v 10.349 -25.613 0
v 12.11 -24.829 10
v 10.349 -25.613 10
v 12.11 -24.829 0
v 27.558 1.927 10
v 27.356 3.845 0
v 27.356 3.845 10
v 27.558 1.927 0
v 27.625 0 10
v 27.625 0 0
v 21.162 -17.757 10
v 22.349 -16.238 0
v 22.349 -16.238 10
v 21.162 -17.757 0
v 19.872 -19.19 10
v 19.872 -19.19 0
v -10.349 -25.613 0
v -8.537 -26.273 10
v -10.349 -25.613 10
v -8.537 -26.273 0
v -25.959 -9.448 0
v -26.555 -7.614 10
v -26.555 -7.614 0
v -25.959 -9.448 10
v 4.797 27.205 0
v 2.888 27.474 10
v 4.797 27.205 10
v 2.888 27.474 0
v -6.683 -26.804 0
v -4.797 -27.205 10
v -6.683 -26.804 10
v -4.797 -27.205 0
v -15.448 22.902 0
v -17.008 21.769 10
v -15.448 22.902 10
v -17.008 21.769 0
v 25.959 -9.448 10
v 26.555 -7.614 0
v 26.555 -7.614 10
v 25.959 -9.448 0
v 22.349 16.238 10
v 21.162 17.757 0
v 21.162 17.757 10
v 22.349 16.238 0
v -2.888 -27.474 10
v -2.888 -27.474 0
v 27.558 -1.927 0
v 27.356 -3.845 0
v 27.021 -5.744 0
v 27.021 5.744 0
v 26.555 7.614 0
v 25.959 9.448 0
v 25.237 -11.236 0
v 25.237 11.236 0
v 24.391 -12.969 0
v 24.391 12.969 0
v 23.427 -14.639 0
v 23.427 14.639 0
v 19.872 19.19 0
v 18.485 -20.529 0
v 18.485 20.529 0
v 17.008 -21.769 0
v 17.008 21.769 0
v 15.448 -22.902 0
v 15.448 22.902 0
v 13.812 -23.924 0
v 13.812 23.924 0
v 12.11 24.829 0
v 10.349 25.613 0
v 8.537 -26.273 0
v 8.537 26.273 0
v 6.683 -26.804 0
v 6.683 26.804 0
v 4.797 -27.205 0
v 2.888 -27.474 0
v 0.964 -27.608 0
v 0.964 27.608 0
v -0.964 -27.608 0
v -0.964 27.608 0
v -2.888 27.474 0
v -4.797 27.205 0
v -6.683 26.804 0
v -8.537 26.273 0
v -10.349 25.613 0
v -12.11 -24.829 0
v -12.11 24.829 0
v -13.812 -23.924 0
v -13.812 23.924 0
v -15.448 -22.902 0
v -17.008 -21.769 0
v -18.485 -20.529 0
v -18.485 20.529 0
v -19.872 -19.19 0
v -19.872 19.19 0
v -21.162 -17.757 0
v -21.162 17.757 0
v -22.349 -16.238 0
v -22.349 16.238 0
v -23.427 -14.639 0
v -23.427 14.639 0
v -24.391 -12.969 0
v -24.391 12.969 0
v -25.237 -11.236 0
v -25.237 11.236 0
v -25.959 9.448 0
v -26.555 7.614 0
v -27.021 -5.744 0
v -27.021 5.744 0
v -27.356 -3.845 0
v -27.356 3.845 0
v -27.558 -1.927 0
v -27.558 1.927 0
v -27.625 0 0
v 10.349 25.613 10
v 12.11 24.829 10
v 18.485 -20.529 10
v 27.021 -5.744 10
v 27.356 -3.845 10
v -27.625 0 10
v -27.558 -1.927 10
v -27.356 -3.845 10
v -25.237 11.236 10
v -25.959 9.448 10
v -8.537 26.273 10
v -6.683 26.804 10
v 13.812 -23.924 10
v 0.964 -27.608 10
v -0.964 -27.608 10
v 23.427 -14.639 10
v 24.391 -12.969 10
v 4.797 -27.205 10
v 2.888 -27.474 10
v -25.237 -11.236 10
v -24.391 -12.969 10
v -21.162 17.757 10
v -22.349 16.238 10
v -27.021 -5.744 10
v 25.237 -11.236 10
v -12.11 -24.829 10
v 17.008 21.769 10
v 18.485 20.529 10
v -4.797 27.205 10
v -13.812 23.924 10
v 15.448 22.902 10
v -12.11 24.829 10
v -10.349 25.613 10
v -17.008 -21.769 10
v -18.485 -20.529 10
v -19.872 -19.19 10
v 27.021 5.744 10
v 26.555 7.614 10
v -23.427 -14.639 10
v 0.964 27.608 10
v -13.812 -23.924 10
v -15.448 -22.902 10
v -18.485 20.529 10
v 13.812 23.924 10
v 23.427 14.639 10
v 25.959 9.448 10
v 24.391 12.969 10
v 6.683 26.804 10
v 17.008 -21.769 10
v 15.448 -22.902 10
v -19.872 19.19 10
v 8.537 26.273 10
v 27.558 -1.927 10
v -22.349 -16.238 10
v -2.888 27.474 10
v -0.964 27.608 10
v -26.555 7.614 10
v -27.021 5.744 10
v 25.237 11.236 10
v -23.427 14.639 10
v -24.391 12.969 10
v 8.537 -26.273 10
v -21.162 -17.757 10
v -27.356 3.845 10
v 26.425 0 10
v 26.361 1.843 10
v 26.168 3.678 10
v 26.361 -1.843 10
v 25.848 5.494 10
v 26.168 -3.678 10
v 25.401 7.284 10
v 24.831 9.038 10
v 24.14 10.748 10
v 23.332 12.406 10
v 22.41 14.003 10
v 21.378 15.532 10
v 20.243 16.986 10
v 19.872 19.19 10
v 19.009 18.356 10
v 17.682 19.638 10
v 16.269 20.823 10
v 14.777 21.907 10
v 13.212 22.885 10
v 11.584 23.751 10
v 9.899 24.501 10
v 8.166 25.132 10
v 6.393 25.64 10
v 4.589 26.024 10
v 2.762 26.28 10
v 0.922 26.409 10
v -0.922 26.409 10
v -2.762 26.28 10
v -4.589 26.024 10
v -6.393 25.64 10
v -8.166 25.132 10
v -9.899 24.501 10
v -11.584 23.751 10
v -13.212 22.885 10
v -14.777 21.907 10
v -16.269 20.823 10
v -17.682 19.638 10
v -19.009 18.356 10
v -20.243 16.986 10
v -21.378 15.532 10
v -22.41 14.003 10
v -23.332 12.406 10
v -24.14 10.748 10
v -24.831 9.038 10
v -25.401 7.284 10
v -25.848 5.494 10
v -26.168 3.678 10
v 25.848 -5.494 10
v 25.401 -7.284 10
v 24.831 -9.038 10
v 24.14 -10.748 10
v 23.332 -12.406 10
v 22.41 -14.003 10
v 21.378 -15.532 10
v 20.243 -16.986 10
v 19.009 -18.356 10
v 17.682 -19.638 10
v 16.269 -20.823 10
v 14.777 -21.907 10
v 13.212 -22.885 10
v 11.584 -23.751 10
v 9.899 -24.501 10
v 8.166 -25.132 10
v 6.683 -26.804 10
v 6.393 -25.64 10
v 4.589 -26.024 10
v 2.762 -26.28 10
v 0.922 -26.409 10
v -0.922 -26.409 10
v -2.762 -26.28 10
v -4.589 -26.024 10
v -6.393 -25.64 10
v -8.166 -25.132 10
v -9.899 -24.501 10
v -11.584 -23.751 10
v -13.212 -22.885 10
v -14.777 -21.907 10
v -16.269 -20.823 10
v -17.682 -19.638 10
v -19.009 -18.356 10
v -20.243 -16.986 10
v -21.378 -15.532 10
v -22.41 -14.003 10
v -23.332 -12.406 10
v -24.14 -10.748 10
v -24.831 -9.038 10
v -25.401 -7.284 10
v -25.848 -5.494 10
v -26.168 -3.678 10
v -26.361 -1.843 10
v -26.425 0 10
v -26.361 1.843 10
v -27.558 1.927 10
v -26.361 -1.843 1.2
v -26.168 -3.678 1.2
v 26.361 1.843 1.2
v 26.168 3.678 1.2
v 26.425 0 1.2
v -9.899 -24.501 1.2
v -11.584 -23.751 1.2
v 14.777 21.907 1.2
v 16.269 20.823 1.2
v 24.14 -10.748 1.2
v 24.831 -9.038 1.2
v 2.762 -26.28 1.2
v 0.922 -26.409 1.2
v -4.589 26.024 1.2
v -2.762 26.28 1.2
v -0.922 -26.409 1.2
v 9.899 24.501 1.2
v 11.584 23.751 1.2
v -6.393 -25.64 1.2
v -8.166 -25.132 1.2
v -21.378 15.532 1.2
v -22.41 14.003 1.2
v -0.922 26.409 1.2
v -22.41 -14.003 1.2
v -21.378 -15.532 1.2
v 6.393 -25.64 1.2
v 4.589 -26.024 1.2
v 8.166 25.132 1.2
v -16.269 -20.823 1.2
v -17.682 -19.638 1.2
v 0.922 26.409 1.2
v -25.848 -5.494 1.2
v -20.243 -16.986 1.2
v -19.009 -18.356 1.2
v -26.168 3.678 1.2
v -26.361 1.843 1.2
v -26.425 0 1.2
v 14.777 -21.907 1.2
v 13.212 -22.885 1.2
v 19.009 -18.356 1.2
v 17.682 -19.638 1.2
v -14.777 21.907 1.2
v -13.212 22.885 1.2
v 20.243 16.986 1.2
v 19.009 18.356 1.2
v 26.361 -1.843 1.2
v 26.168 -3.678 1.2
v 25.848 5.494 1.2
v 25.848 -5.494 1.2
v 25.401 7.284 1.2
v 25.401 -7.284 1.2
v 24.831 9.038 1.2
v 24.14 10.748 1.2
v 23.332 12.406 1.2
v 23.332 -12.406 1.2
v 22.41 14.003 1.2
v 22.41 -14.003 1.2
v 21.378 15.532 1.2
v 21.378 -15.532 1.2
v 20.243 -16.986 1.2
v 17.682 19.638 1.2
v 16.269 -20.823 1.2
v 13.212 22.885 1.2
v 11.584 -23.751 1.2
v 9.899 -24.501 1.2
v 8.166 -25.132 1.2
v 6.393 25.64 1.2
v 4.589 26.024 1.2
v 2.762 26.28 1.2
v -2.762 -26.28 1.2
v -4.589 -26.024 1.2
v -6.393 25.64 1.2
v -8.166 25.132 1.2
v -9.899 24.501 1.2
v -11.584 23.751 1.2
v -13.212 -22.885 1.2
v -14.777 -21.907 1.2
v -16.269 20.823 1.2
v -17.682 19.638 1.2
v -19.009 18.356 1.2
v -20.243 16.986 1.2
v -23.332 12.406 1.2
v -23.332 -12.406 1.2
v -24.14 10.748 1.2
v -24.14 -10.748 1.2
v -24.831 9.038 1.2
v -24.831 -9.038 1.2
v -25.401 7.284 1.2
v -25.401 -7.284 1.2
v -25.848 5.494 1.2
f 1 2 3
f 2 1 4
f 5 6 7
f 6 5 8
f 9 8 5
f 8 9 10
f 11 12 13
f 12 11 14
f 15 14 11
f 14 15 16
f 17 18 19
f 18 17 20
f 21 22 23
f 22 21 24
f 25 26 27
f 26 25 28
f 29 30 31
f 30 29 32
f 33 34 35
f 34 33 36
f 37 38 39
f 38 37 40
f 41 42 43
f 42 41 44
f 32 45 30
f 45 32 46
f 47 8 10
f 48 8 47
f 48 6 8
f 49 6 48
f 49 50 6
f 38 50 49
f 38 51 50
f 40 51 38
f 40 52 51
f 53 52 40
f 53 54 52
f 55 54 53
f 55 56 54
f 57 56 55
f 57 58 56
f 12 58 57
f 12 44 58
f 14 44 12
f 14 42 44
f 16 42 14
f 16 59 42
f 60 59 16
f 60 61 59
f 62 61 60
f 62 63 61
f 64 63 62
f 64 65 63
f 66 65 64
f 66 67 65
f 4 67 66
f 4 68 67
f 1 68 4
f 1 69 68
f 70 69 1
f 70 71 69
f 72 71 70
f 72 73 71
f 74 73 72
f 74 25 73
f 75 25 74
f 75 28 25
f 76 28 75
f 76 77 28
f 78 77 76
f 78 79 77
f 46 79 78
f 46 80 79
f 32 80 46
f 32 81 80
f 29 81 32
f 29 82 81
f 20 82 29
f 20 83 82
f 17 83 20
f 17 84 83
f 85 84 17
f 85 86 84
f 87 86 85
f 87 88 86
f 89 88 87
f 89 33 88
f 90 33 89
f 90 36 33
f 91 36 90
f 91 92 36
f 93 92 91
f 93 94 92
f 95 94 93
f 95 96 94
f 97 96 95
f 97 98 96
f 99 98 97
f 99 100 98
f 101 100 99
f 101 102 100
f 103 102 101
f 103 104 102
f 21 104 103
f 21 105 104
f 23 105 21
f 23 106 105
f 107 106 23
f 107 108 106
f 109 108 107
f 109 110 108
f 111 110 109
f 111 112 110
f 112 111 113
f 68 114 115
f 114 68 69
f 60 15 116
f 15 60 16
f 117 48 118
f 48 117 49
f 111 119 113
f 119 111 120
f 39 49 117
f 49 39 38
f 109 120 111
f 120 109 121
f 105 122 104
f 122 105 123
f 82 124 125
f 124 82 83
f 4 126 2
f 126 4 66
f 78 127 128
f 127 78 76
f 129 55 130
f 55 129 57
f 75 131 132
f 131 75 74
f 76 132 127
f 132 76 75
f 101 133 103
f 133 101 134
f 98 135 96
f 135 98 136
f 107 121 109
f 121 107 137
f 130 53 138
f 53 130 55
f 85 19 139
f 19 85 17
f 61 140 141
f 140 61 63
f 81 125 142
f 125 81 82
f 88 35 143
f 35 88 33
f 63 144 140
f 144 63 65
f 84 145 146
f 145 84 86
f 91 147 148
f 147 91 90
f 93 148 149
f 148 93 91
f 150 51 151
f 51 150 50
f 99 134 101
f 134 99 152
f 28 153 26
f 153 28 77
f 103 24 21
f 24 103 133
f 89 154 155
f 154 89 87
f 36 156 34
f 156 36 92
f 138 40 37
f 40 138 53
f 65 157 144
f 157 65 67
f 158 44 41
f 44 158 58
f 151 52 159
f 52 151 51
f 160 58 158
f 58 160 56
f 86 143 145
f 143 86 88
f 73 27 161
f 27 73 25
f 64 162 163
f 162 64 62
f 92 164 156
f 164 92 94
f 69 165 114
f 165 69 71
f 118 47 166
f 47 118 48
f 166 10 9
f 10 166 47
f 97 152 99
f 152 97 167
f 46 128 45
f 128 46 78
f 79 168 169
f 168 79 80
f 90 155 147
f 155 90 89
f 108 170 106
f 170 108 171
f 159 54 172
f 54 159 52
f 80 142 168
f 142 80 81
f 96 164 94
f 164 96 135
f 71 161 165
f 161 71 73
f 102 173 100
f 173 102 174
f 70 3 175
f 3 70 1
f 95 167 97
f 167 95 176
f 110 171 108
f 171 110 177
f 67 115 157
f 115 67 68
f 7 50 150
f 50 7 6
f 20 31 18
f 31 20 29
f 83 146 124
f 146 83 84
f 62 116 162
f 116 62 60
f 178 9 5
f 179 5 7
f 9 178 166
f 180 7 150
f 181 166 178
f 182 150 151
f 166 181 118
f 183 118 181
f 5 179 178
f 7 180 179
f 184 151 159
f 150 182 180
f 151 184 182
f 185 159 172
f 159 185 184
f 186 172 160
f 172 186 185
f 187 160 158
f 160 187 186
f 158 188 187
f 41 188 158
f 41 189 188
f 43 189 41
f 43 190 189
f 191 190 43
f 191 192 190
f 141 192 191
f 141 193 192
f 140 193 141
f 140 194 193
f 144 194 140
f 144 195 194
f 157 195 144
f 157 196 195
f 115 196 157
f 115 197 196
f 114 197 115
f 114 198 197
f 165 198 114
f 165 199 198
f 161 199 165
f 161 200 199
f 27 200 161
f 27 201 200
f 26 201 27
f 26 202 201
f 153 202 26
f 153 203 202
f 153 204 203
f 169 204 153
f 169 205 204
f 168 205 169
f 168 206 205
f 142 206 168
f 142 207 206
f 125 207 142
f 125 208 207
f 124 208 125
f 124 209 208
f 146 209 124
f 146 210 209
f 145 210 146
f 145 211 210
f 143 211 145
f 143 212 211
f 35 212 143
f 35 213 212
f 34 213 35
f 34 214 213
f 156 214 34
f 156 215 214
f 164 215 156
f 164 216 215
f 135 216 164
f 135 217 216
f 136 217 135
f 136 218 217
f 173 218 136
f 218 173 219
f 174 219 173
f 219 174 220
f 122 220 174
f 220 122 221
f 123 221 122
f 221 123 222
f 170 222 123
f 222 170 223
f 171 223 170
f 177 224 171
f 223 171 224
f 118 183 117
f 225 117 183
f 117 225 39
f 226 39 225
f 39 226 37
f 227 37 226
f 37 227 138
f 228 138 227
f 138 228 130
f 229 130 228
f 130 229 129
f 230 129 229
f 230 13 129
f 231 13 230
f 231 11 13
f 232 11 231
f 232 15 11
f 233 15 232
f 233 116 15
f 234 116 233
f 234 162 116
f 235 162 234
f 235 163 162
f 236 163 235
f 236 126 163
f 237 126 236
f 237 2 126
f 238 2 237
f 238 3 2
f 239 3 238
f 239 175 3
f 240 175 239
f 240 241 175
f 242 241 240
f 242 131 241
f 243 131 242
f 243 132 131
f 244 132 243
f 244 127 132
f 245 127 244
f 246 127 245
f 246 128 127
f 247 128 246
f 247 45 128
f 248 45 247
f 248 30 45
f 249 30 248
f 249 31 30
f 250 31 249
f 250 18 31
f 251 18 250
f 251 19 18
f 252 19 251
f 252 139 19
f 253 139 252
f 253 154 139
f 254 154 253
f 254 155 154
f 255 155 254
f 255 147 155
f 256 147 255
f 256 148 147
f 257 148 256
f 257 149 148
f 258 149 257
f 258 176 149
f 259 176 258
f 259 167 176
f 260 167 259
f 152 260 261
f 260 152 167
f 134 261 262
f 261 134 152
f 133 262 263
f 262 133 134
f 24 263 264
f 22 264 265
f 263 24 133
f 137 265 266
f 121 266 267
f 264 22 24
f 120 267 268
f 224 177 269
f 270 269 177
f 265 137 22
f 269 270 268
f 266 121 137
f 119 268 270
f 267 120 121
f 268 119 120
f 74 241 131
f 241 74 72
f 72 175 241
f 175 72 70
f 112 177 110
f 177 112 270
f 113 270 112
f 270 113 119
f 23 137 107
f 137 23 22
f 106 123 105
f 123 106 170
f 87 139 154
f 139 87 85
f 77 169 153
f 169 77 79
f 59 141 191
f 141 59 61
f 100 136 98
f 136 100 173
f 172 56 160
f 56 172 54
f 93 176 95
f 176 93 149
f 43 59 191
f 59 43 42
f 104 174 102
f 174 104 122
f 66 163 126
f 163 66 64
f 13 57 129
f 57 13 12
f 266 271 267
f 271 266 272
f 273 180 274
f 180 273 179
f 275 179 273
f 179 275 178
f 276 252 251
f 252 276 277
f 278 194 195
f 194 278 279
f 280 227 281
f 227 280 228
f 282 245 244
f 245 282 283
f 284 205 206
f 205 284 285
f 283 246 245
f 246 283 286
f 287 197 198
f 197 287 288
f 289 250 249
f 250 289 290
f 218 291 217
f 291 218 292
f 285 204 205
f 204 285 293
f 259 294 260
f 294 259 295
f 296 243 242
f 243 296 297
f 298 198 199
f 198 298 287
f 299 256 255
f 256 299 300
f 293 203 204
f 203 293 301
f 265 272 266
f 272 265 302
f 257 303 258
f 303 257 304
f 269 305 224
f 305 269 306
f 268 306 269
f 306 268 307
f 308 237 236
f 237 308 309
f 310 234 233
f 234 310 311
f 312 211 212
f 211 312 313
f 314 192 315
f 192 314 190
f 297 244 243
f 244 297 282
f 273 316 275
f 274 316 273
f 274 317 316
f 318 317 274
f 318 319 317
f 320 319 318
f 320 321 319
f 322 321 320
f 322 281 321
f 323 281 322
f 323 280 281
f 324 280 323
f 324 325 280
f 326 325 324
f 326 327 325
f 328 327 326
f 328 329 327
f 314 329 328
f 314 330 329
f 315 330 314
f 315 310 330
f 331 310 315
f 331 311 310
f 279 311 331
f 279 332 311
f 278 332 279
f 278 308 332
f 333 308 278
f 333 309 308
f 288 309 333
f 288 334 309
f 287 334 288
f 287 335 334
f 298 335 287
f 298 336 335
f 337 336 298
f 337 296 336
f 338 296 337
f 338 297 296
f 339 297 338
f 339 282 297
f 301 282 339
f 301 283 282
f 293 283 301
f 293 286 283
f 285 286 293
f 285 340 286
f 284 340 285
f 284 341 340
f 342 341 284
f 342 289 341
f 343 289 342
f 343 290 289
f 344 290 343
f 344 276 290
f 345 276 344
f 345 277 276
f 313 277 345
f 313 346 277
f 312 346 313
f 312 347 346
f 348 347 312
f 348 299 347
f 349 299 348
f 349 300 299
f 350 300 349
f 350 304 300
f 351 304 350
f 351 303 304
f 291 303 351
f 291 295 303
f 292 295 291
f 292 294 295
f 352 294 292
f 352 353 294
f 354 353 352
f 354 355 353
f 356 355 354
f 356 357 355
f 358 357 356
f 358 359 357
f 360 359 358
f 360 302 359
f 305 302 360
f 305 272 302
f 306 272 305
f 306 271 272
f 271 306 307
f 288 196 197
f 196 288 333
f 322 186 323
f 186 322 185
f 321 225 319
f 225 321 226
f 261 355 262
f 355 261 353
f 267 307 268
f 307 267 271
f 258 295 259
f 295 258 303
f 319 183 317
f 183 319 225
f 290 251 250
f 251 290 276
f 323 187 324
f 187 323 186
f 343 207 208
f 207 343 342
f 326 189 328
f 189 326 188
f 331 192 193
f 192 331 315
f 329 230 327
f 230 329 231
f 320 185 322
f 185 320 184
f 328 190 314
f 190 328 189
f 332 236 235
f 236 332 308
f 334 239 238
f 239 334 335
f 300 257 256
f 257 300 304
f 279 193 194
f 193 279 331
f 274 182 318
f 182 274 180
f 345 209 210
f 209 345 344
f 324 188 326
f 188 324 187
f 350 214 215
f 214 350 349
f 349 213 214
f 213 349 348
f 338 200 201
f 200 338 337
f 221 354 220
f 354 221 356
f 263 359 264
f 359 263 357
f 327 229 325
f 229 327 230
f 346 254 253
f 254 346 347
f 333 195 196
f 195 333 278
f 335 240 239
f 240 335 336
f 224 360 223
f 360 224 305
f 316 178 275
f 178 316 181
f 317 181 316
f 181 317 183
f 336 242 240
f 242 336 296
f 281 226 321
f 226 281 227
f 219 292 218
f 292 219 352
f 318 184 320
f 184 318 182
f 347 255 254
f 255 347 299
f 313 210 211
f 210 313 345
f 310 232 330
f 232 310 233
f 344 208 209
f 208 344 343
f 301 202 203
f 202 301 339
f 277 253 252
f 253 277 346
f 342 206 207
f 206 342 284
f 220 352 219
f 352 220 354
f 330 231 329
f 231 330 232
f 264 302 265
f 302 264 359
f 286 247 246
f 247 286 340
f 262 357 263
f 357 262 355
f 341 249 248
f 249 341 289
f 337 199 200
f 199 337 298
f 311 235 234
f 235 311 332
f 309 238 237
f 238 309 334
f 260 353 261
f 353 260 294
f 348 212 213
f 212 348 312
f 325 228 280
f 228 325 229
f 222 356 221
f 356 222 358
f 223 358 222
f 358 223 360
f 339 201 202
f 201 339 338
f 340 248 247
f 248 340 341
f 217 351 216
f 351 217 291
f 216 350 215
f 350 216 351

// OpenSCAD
// file: _common.scad
$fa=4; // default minimum facet angle is now 0.5
$fs=0.05; // default minimum facet size is now 0.05 mm

innerRad = 80/2;
outerRad = 199/2;
depth = 60;
height = 61.5;

m3TapRad = 1.3;
screwHoleXDistance = 4;
screwHoleYDistance = 8.25;

detentRad = 3.3/2;

wallThickness = 1.2;

fingerHoleRad = 10;

holeRad = 55.25/2;
holeRadOffset = .05;

dowelRad = 12.25 / 2;
// main file
include <_common.scad>;

difference() {
  cylinder(r = holeRad, h = 10);
  translate([0, 0, wallThickness]) cylinder(r = holeRad - wallThickness, h = 10);
}
